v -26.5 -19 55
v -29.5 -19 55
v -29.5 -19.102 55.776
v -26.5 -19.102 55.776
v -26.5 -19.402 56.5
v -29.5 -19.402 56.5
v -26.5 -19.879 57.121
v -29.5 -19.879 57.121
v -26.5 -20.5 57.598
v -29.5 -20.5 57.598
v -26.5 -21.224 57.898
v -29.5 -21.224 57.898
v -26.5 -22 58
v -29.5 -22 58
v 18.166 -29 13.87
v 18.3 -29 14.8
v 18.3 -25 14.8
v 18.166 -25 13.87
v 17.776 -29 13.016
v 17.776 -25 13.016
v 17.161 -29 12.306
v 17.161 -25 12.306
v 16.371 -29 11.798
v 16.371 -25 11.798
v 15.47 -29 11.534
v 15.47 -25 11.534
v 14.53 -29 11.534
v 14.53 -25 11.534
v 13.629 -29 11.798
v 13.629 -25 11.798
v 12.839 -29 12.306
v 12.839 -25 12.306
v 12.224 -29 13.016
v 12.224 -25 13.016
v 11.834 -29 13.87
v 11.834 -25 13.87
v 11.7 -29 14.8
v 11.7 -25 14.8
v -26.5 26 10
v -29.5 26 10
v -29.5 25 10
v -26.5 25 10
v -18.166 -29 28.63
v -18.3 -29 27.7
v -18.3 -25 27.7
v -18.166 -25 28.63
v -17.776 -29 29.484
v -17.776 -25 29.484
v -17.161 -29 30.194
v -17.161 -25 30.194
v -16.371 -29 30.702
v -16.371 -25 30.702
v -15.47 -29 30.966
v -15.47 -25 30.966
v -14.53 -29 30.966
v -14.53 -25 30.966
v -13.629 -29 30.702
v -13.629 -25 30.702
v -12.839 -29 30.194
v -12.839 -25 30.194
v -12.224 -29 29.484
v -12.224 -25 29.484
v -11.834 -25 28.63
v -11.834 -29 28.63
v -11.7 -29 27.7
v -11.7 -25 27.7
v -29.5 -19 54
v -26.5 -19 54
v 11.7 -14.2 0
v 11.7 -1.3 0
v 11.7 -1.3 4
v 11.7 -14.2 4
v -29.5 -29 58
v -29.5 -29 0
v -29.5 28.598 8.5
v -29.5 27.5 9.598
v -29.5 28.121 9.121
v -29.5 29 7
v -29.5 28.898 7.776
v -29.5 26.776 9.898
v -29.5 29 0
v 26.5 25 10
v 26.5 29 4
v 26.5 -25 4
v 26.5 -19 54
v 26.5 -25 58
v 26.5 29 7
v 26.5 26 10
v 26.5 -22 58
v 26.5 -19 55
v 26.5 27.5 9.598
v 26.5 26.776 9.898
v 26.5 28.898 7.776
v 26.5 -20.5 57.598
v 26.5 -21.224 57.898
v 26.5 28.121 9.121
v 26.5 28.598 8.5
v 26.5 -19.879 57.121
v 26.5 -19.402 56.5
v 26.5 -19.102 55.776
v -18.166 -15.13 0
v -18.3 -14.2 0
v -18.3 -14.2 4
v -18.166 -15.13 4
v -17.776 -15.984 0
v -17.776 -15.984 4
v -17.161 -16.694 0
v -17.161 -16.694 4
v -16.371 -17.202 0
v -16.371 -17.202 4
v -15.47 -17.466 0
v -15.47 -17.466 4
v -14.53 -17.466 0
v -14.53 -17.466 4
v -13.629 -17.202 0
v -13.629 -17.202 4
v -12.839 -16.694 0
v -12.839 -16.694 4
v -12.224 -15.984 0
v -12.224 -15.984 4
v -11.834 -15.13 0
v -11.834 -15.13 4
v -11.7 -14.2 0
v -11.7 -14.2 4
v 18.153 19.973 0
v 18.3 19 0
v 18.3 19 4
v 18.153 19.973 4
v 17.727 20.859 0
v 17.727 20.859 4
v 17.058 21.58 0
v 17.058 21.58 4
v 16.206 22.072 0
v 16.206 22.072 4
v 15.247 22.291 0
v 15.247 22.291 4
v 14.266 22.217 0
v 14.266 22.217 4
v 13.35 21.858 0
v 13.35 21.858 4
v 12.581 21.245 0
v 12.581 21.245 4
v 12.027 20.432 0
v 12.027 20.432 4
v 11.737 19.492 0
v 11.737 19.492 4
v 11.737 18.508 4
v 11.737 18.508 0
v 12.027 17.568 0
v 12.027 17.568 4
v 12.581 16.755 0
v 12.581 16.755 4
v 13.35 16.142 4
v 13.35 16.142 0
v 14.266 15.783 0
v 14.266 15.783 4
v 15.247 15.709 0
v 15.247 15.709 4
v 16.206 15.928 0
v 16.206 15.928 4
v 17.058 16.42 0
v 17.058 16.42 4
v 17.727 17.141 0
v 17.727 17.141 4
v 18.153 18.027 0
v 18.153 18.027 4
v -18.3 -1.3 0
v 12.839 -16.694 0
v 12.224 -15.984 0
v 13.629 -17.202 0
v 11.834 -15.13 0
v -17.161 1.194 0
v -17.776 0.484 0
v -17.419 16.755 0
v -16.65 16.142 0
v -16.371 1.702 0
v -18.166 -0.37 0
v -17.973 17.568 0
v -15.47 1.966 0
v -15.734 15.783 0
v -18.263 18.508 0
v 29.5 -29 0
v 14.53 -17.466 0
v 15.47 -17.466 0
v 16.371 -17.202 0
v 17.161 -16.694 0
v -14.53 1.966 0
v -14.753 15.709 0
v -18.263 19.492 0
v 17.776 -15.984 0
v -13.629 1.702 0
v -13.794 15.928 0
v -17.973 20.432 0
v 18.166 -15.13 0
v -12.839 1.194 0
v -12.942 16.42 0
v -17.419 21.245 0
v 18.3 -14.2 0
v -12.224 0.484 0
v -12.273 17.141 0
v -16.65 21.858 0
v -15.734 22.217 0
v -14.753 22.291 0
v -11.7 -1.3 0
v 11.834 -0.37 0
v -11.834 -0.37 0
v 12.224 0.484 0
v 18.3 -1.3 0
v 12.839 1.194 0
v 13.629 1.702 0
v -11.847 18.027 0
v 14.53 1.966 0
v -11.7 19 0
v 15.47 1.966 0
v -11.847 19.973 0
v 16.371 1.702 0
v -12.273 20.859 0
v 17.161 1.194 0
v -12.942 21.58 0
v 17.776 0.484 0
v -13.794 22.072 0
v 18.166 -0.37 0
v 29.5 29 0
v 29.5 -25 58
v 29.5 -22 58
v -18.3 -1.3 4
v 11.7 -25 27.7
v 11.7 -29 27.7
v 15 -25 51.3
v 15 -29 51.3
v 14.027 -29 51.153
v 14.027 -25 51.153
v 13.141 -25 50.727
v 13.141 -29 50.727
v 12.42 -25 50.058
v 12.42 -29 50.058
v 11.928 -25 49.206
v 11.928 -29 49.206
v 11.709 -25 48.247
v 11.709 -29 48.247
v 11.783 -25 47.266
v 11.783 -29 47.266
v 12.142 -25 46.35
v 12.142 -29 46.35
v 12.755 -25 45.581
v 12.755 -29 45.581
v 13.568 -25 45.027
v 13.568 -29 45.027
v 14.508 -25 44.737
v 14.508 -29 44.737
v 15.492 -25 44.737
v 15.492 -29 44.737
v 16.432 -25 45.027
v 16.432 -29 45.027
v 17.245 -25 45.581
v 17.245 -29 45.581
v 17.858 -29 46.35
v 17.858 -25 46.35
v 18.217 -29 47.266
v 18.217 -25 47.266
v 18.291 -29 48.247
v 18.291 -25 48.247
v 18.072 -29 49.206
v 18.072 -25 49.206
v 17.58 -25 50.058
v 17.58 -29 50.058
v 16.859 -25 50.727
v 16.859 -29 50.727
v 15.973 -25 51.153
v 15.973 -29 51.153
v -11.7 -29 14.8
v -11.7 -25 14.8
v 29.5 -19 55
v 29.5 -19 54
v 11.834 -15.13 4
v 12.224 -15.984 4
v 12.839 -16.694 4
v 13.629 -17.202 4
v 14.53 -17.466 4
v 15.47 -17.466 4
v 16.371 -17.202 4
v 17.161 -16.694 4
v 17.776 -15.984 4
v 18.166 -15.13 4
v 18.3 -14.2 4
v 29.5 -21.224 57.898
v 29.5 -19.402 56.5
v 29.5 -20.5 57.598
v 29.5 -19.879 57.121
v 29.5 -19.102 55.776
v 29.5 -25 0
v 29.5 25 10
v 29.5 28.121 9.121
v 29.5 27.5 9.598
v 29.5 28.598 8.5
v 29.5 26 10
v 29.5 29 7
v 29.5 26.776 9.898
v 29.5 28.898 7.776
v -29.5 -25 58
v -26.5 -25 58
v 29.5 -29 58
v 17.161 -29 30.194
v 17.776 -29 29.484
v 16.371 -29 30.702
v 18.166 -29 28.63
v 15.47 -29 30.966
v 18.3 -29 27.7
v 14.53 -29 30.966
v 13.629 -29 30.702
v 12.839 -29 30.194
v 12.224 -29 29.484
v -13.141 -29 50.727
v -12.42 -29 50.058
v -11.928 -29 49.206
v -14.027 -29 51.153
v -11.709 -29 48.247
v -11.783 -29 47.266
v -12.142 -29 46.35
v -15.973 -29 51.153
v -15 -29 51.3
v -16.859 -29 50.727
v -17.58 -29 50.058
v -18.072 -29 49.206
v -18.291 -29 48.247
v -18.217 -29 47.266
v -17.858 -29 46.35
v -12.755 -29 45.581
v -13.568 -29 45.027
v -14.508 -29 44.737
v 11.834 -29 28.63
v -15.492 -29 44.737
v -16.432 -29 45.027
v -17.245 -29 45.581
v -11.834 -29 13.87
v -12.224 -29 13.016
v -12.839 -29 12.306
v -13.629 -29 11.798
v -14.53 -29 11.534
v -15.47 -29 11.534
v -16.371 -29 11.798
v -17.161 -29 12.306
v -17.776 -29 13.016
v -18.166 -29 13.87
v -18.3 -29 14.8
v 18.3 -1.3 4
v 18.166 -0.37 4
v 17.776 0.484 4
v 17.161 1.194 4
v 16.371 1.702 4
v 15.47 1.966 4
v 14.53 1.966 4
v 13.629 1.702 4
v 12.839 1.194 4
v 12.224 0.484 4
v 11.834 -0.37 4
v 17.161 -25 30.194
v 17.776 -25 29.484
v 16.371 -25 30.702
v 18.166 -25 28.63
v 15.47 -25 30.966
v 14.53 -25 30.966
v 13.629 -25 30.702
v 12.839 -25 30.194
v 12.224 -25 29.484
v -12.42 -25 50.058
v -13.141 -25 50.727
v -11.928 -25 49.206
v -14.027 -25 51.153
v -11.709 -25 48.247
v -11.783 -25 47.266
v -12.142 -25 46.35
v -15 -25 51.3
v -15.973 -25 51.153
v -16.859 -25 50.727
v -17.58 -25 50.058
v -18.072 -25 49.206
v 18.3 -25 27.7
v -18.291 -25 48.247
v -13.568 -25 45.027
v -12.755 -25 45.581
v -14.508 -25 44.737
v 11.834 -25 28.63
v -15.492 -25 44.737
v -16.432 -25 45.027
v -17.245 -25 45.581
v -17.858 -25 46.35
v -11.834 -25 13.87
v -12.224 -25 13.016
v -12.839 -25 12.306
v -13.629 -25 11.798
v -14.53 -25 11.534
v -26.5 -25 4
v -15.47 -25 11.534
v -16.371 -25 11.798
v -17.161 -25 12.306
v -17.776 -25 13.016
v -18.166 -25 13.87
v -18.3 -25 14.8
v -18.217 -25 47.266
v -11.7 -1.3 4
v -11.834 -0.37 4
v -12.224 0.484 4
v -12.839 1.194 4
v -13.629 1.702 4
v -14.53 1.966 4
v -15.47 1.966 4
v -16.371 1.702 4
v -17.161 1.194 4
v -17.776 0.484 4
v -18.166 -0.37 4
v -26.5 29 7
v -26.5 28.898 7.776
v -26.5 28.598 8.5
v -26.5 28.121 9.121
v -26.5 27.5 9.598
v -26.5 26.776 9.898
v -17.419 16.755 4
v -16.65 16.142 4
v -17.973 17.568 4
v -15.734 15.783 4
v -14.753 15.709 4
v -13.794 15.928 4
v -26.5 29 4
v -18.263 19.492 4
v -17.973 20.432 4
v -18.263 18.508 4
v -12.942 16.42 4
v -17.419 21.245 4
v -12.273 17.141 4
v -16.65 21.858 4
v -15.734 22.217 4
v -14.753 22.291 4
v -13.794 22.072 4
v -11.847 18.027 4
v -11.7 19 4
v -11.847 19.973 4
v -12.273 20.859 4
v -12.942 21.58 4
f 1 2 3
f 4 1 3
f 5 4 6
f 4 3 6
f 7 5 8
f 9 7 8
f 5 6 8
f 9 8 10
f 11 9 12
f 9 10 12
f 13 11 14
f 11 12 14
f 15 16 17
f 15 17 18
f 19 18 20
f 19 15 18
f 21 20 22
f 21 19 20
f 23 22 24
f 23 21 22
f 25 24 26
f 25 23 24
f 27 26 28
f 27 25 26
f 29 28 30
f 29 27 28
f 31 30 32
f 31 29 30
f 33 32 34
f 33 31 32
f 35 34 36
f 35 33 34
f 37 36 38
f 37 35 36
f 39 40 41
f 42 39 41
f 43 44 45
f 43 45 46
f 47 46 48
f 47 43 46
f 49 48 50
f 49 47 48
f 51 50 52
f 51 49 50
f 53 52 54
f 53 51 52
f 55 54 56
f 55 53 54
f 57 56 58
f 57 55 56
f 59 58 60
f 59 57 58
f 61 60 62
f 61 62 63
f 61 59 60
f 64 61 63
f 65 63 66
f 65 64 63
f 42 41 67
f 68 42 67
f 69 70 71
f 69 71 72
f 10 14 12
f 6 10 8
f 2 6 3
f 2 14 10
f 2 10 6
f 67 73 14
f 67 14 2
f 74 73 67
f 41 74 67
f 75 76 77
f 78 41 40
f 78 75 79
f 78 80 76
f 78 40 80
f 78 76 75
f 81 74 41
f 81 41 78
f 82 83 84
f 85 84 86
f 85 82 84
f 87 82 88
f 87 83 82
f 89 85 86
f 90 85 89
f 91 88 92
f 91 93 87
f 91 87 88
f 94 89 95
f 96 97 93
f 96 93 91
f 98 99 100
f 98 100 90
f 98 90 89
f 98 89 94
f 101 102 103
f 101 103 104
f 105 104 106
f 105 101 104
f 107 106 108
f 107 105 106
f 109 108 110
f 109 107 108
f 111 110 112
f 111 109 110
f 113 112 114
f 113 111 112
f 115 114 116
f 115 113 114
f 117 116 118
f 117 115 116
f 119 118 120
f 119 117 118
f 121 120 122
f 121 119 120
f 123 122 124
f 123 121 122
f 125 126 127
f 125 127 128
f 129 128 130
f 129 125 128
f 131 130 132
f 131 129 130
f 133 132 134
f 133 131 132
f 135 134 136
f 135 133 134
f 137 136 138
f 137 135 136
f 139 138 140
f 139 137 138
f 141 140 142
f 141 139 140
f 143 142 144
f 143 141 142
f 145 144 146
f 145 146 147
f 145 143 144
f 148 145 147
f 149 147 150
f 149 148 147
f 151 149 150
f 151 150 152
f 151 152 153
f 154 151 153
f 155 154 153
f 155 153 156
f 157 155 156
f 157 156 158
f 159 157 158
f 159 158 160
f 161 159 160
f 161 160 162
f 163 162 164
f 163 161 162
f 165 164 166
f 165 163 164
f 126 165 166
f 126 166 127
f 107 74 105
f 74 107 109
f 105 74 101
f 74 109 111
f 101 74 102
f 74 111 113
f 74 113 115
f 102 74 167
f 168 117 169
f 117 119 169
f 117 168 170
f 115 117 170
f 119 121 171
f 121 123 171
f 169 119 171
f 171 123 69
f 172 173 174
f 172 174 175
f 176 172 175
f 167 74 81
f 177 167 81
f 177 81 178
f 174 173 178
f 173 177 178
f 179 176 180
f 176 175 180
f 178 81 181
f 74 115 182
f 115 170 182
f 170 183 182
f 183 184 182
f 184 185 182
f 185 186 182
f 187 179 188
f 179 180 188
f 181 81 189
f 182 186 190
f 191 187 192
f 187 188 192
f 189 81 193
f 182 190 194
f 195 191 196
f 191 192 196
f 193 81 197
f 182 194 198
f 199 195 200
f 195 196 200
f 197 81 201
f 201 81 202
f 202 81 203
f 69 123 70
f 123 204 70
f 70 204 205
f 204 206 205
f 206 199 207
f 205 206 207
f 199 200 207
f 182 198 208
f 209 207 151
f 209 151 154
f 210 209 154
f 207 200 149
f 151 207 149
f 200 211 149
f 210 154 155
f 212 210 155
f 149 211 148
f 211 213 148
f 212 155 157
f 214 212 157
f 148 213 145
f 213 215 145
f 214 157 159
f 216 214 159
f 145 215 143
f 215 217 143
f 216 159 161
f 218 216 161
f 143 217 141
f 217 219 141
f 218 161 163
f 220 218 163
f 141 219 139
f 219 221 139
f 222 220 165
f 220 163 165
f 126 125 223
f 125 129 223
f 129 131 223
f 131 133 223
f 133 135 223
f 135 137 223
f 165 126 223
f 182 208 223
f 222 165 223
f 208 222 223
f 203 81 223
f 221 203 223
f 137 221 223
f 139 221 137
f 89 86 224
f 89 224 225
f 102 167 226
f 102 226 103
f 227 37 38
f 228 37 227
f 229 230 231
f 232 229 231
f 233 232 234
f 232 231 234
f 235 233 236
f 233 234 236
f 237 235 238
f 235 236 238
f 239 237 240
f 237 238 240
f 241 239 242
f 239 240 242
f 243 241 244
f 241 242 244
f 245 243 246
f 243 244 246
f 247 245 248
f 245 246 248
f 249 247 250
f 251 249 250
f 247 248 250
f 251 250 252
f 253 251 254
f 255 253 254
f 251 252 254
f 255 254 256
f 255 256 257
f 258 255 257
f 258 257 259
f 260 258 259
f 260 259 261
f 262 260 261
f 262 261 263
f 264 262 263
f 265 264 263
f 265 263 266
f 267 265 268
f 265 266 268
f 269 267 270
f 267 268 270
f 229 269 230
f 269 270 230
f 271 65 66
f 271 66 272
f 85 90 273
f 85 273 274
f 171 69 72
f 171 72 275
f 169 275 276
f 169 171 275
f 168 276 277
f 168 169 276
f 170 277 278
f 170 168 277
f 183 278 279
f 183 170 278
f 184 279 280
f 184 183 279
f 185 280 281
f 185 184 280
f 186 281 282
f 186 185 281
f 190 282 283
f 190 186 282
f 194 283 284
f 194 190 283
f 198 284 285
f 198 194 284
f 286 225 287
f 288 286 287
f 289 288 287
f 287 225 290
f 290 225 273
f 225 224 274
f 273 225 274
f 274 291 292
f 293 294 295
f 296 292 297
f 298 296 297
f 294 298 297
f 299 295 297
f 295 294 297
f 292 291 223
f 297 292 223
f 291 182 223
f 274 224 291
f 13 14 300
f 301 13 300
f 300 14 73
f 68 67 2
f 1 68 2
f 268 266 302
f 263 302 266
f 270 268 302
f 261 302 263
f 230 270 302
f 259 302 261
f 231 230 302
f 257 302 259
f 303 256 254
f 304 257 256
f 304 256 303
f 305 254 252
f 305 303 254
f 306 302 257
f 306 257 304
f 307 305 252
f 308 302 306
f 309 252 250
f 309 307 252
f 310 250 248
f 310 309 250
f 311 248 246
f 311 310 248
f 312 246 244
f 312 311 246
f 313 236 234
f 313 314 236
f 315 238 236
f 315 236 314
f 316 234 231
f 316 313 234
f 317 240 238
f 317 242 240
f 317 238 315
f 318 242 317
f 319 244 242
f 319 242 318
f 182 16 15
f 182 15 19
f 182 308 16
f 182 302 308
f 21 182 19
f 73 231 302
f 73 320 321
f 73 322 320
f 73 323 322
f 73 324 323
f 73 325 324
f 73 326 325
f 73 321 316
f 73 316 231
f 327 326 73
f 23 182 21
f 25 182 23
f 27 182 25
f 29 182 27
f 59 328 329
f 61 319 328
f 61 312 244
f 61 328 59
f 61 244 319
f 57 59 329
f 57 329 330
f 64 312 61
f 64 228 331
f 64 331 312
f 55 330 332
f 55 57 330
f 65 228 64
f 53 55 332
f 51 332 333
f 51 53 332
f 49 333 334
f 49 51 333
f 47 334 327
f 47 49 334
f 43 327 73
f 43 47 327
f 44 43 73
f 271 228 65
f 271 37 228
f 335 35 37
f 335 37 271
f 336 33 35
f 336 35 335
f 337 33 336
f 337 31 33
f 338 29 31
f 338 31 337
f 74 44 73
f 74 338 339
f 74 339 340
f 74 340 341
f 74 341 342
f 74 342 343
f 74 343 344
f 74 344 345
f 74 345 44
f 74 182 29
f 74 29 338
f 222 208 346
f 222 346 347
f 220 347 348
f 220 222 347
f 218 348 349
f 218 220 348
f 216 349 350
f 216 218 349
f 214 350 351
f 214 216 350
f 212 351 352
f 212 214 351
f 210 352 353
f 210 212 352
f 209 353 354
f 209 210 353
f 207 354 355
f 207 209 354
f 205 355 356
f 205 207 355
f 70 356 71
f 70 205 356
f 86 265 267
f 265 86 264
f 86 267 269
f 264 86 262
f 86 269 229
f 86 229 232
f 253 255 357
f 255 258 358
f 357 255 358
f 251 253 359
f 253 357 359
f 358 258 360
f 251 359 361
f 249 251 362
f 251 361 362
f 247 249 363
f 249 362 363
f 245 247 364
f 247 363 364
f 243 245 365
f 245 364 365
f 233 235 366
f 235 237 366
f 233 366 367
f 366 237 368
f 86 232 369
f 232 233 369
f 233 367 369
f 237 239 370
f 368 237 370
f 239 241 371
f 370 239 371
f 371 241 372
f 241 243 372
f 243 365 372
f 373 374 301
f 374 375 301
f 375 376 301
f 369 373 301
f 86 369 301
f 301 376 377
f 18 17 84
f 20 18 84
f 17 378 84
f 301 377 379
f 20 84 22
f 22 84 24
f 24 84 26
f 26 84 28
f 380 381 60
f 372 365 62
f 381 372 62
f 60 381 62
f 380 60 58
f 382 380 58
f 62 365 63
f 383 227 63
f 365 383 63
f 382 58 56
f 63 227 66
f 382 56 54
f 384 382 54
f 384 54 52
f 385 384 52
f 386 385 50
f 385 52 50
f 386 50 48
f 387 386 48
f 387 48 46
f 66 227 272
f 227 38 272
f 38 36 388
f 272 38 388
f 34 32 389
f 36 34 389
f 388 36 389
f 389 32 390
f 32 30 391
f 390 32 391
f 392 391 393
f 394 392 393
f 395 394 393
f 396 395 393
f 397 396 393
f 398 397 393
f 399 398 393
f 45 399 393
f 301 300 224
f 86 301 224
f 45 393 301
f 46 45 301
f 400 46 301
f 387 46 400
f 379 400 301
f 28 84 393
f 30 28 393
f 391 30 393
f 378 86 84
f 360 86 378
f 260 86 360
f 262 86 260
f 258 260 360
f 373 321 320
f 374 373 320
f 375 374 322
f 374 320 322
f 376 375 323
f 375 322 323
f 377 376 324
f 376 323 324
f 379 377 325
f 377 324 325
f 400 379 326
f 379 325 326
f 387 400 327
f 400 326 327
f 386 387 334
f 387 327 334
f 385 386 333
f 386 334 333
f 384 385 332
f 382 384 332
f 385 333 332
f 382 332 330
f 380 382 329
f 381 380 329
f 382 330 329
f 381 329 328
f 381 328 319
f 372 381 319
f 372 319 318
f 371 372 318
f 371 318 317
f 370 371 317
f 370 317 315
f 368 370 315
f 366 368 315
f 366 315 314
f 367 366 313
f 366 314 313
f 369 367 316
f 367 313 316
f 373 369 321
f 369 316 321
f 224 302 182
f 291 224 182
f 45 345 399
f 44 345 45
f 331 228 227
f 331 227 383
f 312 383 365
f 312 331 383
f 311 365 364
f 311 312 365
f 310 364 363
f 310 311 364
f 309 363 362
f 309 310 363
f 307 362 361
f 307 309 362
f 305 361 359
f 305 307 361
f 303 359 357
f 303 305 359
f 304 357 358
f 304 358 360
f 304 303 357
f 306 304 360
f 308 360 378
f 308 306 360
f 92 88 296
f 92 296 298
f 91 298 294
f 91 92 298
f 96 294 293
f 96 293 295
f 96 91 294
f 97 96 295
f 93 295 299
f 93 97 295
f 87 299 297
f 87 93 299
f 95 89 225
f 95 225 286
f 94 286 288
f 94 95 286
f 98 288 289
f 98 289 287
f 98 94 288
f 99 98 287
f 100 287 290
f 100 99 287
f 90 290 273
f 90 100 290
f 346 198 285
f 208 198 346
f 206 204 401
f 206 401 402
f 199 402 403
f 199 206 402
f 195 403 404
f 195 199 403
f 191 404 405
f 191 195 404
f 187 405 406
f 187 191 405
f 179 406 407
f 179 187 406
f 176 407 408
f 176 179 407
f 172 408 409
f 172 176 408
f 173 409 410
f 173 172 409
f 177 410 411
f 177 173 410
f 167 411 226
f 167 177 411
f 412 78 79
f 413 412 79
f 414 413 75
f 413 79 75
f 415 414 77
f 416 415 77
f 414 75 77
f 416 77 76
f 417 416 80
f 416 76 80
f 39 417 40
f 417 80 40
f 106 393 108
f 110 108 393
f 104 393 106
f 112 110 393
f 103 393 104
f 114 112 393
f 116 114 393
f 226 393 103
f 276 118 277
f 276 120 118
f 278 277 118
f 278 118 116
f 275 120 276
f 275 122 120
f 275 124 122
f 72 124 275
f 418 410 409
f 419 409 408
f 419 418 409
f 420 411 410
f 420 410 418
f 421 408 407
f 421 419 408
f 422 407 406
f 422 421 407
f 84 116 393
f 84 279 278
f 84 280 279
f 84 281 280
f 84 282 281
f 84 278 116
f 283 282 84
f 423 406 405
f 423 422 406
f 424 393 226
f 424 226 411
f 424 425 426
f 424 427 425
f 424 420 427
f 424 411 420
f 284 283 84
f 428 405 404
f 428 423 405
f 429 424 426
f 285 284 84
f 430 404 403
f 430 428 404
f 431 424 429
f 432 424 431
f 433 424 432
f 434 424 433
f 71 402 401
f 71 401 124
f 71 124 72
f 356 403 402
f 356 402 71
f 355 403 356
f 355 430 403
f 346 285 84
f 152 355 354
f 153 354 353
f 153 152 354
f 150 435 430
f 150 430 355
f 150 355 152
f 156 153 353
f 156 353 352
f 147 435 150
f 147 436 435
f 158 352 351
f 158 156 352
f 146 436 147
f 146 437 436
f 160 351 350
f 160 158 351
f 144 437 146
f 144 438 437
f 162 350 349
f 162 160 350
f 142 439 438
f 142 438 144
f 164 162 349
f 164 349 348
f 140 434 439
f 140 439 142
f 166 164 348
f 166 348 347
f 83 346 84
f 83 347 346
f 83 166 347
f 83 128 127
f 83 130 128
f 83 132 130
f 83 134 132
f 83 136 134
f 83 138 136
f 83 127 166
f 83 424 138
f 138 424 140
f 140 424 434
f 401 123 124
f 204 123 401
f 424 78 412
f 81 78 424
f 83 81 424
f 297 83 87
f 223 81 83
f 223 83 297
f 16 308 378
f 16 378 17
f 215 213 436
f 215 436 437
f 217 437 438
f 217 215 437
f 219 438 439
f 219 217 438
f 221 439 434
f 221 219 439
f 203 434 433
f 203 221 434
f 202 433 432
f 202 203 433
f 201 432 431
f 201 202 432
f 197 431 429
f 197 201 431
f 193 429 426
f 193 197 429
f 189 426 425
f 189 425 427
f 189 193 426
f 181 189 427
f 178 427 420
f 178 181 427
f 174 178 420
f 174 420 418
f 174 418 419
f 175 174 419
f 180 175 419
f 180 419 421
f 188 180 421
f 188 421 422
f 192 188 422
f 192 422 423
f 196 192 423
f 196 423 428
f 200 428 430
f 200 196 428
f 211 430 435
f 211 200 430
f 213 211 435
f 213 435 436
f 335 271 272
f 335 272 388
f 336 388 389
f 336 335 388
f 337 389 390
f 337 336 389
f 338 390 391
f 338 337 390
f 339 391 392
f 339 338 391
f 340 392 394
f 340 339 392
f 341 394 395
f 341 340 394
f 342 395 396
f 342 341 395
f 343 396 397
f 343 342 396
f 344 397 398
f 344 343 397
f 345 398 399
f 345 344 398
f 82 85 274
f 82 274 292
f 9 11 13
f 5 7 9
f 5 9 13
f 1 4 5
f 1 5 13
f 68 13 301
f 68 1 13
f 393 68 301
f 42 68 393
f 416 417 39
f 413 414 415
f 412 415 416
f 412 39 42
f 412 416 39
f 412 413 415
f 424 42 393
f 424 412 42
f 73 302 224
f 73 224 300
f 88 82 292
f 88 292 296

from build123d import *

# Parameters (mm, degrees)
SKETCH_1_W      = 59
SKETCH_1_H      = 58
SKETCH_1_R      = 3.3
EXTRUDE_1_DEPTH = 4
EXTRUDE_3_DEPTH = 3
EXTRUDE_START   = -3
EXTRUDE_6_DEPTH = 3
SKETCH_4_W      = 59
SKETCH_4_H      = 58
SKETCH_4_R      = 3.3
EXTRUDE_7_DEPTH = 4


with BuildPart() as part:
    # Эскиз1 → Бобышка-Вытянуть1 (new body)
    with BuildSketch(Plane.XY):
        Rectangle(SKETCH_1_W, SKETCH_1_H)
        with Locations((-15, 19)):
            Circle(SKETCH_1_R, mode=Mode.SUBTRACT)
        with Locations((15, 19)):
            Circle(SKETCH_1_R, mode=Mode.SUBTRACT)
        with BuildLine():
            Line((18.3, -14.2), (18.3, -1.3))
            ThreePointArc((18.3, -1.3), (15, 2), (11.7, -1.3))
            Line((11.7, -1.3), (11.7, -14.2))
            ThreePointArc((11.7, -14.2), (15, -17.5), (18.3, -14.2))
        make_face(mode=Mode.SUBTRACT)
        with BuildLine():
            Line((-18.3, -1.3), (-18.3, -14.2))
            ThreePointArc((-18.3, -14.2), (-15, -17.5), (-11.7, -14.2))
            Line((-11.7, -14.2), (-11.7, -1.3))
            ThreePointArc((-11.7, -1.3), (-15, 2), (-18.3, -1.3))
        make_face(mode=Mode.SUBTRACT)
    extrude(amount=EXTRUDE_1_DEPTH)

    # Эскиз5 → Бобышка-Вытянуть3 (add)
    with BuildSketch(Plane.ZY.offset(29.5)):
        with BuildLine():
            Line((0, 29), (7, 29))
            ThreePointArc((7, 29), (9.121320344, 28.121320344), (10, 26))
            Line((10, 26), (10, 25))
            Line((10, 25), (54, -19))
            Line((54, -19), (55, -19))
            ThreePointArc((55, -19), (57.121320344, -19.878679656), (58, -22))
            Line((58, -22), (58, -29))
            Line((58, -29), (0, -29))
            Line((0, -29), (0, 29))
        make_face()
    extrude(amount=-EXTRUDE_3_DEPTH)

    # Эскиз6 → Бобышка-Вытянуть6 (add)
    with BuildSketch(Plane(origin=(29.5, 0, 0), x_dir=(0, 0, -1), z_dir=(1, 0, 0)).offset(EXTRUDE_START)):
        with BuildLine():
            Line((0, 29), (0, -29))
            Line((0, -29), (-58, -29))
            Line((-58, -29), (-58, -22))
            ThreePointArc((-58, -22), (-57.121320344, -19.878679656), (-55, -19))
            Line((-55, -19), (-54, -19))
            Line((-54, -19), (-10, 25))
            Line((-10, 25), (-10, 26))
            ThreePointArc((-10, 26), (-9.121320344, 28.121320344), (-7, 29))
            Line((-7, 29), (0, 29))
        make_face()
    extrude(amount=EXTRUDE_6_DEPTH)

    # Эскиз4 → Бобышка-Вытянуть7 (add)
    with BuildSketch(Plane(origin=(0, -29, 0), x_dir=(-1, 0, 0), z_dir=(0, -1, 0))):
        with Locations((-5.17e-07, -29.000001301)):
            Rectangle(SKETCH_4_W, SKETCH_4_H)
        with Locations(Location((14.999999483, -48.000001301, 0), (0, 0, 270))):
            Circle(SKETCH_4_R, mode=Mode.SUBTRACT)
        with Locations(Location((-15.000000517, -48.000001301, 0), (0, 0, 270))):
            Circle(SKETCH_4_R, mode=Mode.SUBTRACT)
        with BuildLine():
            Line((11.699999483, -27.700001301), (11.699999483, -14.800001301))
            ThreePointArc((11.699999483, -14.800001301), (14.999999483, -11.500001301), (18.299999483, -14.800001301))
            Line((18.299999483, -14.800001301), (18.299999483, -27.700001301))
            ThreePointArc((18.299999483, -27.700001301), (14.999999483, -31.000001301), (11.699999483, -27.700001301))
        make_face(mode=Mode.SUBTRACT)
        with BuildLine():
            Line((-11.700000517, -14.800001301), (-11.700000517, -27.700001301))
            ThreePointArc((-11.700000517, -27.700001301), (-15.000000517, -31.000001301), (-18.300000517, -27.700001301))
            Line((-18.300000517, -27.700001301), (-18.300000517, -14.800001301))
            ThreePointArc((-18.300000517, -14.800001301), (-15.000000517, -11.500001301), (-11.700000517, -14.800001301))
        make_face(mode=Mode.SUBTRACT)
    extrude(amount=-EXTRUDE_7_DEPTH)


solid = part.part
